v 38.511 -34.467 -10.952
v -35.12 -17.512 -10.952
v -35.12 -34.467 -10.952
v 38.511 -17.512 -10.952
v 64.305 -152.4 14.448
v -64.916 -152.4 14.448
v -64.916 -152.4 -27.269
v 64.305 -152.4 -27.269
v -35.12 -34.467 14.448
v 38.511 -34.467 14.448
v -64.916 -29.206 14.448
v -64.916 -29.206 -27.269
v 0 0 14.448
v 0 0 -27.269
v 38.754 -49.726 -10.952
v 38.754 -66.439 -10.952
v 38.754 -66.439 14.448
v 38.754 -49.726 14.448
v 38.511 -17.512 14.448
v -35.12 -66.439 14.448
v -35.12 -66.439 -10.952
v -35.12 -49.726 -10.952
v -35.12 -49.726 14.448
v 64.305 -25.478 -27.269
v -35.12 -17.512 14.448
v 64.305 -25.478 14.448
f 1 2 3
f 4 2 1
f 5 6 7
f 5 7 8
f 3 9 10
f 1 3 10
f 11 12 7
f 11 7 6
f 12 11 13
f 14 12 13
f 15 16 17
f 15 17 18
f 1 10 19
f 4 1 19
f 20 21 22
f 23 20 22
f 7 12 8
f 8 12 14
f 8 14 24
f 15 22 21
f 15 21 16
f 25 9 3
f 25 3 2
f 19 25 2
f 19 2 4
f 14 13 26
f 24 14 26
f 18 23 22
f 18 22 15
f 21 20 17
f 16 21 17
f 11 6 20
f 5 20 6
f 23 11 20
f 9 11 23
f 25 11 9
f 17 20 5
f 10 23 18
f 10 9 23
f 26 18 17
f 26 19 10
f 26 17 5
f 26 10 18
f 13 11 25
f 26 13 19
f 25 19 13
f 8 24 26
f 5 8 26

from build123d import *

# Parameters (mm, degrees)
F0_W     = 129.2205303907
F0_H     = 41.7168587446
F1_DEPTH = 152.4
F2_W     = 73.6317485571
F2_H     = 16.954690218
F2_W_2   = 73.8739818335
F2_H_2   = 16.7124718428
F3_DEPTH = 25.4
F5_DEPTH = 41.7178587446


with BuildPart() as f1:
    # F0 (on Front) → F1 (new body)
    with BuildSketch(Plane.XZ):
        with Locations((-0.3052428365, -6.4101442695)):
            Rectangle(F0_W, F0_H)
    extrude(amount=F1_DEPTH)

    # F2 (on face) → F3 (cut)
    with BuildSketch(Plane.XY.offset(14.4482851028)):
        with Locations((1.6954615712, -25.9895175695)):
            Rectangle(F2_W, F2_H)
        with Locations((1.8165782094, -58.0823048949)):
            Rectangle(F2_W_2, F2_H_2)
    extrude(amount=-F3_DEPTH, mode=Mode.SUBTRACT)

    # F4 (on face) → F5 (cut, through all)
    with BuildSketch(Plane.XY.offset(14.4482851028)):
        Polygon((64.3050223589, 0), (0, 0), (64.3050223589, -25.4777166992), align=None)
        Polygon((-64.9155080318, 0), (-64.9155080318, -29.2058624327), (0, 0), align=None)
    extrude(amount=-F5_DEPTH, mode=Mode.SUBTRACT)


solid = f1.part
